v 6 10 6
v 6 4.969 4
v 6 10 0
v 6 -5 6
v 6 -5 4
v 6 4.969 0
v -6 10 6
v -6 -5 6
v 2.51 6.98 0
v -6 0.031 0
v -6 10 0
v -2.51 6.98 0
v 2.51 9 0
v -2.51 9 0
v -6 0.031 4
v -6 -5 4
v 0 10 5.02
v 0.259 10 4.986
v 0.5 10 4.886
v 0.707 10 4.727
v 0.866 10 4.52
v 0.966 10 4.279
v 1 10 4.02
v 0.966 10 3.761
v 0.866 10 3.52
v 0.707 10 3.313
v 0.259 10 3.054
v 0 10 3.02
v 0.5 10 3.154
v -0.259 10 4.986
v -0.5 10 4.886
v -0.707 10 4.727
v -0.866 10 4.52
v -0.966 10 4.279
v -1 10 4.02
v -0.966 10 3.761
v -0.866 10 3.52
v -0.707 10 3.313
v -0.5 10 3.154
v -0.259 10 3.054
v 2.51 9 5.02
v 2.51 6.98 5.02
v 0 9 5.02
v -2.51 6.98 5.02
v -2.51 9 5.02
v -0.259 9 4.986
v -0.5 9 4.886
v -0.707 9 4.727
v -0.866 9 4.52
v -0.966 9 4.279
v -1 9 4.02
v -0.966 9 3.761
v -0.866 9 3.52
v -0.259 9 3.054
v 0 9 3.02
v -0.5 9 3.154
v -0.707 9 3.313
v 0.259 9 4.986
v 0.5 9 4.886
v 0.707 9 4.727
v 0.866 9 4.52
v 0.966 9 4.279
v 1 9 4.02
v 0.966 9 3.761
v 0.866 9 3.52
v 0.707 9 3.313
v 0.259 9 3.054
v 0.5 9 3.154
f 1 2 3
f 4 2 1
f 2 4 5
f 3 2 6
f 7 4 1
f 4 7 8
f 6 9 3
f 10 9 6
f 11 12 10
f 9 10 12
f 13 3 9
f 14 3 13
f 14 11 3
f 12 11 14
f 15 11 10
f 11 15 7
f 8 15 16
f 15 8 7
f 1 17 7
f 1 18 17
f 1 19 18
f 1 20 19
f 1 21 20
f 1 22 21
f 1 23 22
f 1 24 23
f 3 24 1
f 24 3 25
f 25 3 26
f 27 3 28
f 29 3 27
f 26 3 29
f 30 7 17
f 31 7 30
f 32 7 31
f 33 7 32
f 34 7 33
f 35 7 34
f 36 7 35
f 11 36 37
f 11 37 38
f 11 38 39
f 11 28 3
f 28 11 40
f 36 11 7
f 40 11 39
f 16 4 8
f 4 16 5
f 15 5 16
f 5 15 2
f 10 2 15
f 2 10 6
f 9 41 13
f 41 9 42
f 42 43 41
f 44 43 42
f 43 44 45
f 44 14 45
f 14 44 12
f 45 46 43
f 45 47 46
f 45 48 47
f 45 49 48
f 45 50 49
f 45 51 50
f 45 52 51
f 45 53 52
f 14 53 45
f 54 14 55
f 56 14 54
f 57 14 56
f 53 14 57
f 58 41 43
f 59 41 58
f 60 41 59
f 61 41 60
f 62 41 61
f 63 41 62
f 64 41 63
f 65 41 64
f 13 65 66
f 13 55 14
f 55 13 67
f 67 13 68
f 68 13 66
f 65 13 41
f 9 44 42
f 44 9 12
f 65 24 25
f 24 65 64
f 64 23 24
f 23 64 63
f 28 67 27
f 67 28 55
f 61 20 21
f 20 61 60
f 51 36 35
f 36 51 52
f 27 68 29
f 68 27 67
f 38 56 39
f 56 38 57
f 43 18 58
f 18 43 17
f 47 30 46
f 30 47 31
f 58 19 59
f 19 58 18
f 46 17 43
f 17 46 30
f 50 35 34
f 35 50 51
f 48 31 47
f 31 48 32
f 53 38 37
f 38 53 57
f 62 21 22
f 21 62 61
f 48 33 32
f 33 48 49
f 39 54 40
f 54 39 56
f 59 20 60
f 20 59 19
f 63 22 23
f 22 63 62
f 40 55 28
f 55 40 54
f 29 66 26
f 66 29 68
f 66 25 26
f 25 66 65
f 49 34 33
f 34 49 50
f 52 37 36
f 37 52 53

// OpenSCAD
module Holder
(
	size=[32,10,5],
	holes_diff=[20,3],
	screw_diam=3.1,
	sensor_size=[4.1,1.6,3.05],
	sensor_shift=1,
	quality=2,
)
{
	cutClr=0.1;
	difference()
	{
		cube(size=size,center=false);
		for(i=[-1,1])
		translate([size[0]/2-holes_diff[0]/2*i, size[1]-holes_diff[1], -cutClr])
		cylinder(d=3.1,h=size[2]+2*cutClr,$fn=12*quality);
		//hole for sensor
		translate([size[0]/2-sensor_size[0]/2,sensor_shift,size[2]-sensor_size[2]])
		cube(size=[sensor_size[0],sensor_size[1],sensor_size[2]+cutClr]);
	}
}


module MagnetHolder
(
	size=[12,6],
	clip_shift=-5,
	car_sz=[60.75,50,4],
	car_shift=-10,
	magnet_shift=-1,
	magnet_size=[5.02,2.02],
	service_hole_diam=2,
	quality=2,
)
{
	cutClr=0.1;
	holder_size=[size[0],car_sz[1]/2+car_shift,size[1]];

	difference()
	{
		translate([-size[0]/2,clip_shift,0])
		cube(size=holder_size,center=false);
		//carriage cut
		translate([0,car_shift,-cutClr])
		linear_extrude(height=car_sz[2]+cutClr)
		polygon(points=[
			[-car_sz[0]/2,0],
			[car_sz[0]/2,car_sz[1]/2],
			[car_sz[0]/2,-car_sz[1]/2]
			]);
		//magnet cut
		translate([-magnet_size[0]/2,holder_size[1]-magnet_size[1]+magnet_shift+clip_shift,-cutClr])
		cube(size=[magnet_size[0],magnet_size[1],magnet_size[0]+cutClr],center=false);

		translate([0,holder_size[1]-magnet_size[1]+magnet_shift+clip_shift,magnet_size[0]-service_hole_diam/2])
		rotate(a=-90,v=[1,0,0])
		cylinder(d=service_hole_diam, h=holder_size[1], center=false, $fn=quality*12);
	}
}

//Holder();
MagnetHolder();
